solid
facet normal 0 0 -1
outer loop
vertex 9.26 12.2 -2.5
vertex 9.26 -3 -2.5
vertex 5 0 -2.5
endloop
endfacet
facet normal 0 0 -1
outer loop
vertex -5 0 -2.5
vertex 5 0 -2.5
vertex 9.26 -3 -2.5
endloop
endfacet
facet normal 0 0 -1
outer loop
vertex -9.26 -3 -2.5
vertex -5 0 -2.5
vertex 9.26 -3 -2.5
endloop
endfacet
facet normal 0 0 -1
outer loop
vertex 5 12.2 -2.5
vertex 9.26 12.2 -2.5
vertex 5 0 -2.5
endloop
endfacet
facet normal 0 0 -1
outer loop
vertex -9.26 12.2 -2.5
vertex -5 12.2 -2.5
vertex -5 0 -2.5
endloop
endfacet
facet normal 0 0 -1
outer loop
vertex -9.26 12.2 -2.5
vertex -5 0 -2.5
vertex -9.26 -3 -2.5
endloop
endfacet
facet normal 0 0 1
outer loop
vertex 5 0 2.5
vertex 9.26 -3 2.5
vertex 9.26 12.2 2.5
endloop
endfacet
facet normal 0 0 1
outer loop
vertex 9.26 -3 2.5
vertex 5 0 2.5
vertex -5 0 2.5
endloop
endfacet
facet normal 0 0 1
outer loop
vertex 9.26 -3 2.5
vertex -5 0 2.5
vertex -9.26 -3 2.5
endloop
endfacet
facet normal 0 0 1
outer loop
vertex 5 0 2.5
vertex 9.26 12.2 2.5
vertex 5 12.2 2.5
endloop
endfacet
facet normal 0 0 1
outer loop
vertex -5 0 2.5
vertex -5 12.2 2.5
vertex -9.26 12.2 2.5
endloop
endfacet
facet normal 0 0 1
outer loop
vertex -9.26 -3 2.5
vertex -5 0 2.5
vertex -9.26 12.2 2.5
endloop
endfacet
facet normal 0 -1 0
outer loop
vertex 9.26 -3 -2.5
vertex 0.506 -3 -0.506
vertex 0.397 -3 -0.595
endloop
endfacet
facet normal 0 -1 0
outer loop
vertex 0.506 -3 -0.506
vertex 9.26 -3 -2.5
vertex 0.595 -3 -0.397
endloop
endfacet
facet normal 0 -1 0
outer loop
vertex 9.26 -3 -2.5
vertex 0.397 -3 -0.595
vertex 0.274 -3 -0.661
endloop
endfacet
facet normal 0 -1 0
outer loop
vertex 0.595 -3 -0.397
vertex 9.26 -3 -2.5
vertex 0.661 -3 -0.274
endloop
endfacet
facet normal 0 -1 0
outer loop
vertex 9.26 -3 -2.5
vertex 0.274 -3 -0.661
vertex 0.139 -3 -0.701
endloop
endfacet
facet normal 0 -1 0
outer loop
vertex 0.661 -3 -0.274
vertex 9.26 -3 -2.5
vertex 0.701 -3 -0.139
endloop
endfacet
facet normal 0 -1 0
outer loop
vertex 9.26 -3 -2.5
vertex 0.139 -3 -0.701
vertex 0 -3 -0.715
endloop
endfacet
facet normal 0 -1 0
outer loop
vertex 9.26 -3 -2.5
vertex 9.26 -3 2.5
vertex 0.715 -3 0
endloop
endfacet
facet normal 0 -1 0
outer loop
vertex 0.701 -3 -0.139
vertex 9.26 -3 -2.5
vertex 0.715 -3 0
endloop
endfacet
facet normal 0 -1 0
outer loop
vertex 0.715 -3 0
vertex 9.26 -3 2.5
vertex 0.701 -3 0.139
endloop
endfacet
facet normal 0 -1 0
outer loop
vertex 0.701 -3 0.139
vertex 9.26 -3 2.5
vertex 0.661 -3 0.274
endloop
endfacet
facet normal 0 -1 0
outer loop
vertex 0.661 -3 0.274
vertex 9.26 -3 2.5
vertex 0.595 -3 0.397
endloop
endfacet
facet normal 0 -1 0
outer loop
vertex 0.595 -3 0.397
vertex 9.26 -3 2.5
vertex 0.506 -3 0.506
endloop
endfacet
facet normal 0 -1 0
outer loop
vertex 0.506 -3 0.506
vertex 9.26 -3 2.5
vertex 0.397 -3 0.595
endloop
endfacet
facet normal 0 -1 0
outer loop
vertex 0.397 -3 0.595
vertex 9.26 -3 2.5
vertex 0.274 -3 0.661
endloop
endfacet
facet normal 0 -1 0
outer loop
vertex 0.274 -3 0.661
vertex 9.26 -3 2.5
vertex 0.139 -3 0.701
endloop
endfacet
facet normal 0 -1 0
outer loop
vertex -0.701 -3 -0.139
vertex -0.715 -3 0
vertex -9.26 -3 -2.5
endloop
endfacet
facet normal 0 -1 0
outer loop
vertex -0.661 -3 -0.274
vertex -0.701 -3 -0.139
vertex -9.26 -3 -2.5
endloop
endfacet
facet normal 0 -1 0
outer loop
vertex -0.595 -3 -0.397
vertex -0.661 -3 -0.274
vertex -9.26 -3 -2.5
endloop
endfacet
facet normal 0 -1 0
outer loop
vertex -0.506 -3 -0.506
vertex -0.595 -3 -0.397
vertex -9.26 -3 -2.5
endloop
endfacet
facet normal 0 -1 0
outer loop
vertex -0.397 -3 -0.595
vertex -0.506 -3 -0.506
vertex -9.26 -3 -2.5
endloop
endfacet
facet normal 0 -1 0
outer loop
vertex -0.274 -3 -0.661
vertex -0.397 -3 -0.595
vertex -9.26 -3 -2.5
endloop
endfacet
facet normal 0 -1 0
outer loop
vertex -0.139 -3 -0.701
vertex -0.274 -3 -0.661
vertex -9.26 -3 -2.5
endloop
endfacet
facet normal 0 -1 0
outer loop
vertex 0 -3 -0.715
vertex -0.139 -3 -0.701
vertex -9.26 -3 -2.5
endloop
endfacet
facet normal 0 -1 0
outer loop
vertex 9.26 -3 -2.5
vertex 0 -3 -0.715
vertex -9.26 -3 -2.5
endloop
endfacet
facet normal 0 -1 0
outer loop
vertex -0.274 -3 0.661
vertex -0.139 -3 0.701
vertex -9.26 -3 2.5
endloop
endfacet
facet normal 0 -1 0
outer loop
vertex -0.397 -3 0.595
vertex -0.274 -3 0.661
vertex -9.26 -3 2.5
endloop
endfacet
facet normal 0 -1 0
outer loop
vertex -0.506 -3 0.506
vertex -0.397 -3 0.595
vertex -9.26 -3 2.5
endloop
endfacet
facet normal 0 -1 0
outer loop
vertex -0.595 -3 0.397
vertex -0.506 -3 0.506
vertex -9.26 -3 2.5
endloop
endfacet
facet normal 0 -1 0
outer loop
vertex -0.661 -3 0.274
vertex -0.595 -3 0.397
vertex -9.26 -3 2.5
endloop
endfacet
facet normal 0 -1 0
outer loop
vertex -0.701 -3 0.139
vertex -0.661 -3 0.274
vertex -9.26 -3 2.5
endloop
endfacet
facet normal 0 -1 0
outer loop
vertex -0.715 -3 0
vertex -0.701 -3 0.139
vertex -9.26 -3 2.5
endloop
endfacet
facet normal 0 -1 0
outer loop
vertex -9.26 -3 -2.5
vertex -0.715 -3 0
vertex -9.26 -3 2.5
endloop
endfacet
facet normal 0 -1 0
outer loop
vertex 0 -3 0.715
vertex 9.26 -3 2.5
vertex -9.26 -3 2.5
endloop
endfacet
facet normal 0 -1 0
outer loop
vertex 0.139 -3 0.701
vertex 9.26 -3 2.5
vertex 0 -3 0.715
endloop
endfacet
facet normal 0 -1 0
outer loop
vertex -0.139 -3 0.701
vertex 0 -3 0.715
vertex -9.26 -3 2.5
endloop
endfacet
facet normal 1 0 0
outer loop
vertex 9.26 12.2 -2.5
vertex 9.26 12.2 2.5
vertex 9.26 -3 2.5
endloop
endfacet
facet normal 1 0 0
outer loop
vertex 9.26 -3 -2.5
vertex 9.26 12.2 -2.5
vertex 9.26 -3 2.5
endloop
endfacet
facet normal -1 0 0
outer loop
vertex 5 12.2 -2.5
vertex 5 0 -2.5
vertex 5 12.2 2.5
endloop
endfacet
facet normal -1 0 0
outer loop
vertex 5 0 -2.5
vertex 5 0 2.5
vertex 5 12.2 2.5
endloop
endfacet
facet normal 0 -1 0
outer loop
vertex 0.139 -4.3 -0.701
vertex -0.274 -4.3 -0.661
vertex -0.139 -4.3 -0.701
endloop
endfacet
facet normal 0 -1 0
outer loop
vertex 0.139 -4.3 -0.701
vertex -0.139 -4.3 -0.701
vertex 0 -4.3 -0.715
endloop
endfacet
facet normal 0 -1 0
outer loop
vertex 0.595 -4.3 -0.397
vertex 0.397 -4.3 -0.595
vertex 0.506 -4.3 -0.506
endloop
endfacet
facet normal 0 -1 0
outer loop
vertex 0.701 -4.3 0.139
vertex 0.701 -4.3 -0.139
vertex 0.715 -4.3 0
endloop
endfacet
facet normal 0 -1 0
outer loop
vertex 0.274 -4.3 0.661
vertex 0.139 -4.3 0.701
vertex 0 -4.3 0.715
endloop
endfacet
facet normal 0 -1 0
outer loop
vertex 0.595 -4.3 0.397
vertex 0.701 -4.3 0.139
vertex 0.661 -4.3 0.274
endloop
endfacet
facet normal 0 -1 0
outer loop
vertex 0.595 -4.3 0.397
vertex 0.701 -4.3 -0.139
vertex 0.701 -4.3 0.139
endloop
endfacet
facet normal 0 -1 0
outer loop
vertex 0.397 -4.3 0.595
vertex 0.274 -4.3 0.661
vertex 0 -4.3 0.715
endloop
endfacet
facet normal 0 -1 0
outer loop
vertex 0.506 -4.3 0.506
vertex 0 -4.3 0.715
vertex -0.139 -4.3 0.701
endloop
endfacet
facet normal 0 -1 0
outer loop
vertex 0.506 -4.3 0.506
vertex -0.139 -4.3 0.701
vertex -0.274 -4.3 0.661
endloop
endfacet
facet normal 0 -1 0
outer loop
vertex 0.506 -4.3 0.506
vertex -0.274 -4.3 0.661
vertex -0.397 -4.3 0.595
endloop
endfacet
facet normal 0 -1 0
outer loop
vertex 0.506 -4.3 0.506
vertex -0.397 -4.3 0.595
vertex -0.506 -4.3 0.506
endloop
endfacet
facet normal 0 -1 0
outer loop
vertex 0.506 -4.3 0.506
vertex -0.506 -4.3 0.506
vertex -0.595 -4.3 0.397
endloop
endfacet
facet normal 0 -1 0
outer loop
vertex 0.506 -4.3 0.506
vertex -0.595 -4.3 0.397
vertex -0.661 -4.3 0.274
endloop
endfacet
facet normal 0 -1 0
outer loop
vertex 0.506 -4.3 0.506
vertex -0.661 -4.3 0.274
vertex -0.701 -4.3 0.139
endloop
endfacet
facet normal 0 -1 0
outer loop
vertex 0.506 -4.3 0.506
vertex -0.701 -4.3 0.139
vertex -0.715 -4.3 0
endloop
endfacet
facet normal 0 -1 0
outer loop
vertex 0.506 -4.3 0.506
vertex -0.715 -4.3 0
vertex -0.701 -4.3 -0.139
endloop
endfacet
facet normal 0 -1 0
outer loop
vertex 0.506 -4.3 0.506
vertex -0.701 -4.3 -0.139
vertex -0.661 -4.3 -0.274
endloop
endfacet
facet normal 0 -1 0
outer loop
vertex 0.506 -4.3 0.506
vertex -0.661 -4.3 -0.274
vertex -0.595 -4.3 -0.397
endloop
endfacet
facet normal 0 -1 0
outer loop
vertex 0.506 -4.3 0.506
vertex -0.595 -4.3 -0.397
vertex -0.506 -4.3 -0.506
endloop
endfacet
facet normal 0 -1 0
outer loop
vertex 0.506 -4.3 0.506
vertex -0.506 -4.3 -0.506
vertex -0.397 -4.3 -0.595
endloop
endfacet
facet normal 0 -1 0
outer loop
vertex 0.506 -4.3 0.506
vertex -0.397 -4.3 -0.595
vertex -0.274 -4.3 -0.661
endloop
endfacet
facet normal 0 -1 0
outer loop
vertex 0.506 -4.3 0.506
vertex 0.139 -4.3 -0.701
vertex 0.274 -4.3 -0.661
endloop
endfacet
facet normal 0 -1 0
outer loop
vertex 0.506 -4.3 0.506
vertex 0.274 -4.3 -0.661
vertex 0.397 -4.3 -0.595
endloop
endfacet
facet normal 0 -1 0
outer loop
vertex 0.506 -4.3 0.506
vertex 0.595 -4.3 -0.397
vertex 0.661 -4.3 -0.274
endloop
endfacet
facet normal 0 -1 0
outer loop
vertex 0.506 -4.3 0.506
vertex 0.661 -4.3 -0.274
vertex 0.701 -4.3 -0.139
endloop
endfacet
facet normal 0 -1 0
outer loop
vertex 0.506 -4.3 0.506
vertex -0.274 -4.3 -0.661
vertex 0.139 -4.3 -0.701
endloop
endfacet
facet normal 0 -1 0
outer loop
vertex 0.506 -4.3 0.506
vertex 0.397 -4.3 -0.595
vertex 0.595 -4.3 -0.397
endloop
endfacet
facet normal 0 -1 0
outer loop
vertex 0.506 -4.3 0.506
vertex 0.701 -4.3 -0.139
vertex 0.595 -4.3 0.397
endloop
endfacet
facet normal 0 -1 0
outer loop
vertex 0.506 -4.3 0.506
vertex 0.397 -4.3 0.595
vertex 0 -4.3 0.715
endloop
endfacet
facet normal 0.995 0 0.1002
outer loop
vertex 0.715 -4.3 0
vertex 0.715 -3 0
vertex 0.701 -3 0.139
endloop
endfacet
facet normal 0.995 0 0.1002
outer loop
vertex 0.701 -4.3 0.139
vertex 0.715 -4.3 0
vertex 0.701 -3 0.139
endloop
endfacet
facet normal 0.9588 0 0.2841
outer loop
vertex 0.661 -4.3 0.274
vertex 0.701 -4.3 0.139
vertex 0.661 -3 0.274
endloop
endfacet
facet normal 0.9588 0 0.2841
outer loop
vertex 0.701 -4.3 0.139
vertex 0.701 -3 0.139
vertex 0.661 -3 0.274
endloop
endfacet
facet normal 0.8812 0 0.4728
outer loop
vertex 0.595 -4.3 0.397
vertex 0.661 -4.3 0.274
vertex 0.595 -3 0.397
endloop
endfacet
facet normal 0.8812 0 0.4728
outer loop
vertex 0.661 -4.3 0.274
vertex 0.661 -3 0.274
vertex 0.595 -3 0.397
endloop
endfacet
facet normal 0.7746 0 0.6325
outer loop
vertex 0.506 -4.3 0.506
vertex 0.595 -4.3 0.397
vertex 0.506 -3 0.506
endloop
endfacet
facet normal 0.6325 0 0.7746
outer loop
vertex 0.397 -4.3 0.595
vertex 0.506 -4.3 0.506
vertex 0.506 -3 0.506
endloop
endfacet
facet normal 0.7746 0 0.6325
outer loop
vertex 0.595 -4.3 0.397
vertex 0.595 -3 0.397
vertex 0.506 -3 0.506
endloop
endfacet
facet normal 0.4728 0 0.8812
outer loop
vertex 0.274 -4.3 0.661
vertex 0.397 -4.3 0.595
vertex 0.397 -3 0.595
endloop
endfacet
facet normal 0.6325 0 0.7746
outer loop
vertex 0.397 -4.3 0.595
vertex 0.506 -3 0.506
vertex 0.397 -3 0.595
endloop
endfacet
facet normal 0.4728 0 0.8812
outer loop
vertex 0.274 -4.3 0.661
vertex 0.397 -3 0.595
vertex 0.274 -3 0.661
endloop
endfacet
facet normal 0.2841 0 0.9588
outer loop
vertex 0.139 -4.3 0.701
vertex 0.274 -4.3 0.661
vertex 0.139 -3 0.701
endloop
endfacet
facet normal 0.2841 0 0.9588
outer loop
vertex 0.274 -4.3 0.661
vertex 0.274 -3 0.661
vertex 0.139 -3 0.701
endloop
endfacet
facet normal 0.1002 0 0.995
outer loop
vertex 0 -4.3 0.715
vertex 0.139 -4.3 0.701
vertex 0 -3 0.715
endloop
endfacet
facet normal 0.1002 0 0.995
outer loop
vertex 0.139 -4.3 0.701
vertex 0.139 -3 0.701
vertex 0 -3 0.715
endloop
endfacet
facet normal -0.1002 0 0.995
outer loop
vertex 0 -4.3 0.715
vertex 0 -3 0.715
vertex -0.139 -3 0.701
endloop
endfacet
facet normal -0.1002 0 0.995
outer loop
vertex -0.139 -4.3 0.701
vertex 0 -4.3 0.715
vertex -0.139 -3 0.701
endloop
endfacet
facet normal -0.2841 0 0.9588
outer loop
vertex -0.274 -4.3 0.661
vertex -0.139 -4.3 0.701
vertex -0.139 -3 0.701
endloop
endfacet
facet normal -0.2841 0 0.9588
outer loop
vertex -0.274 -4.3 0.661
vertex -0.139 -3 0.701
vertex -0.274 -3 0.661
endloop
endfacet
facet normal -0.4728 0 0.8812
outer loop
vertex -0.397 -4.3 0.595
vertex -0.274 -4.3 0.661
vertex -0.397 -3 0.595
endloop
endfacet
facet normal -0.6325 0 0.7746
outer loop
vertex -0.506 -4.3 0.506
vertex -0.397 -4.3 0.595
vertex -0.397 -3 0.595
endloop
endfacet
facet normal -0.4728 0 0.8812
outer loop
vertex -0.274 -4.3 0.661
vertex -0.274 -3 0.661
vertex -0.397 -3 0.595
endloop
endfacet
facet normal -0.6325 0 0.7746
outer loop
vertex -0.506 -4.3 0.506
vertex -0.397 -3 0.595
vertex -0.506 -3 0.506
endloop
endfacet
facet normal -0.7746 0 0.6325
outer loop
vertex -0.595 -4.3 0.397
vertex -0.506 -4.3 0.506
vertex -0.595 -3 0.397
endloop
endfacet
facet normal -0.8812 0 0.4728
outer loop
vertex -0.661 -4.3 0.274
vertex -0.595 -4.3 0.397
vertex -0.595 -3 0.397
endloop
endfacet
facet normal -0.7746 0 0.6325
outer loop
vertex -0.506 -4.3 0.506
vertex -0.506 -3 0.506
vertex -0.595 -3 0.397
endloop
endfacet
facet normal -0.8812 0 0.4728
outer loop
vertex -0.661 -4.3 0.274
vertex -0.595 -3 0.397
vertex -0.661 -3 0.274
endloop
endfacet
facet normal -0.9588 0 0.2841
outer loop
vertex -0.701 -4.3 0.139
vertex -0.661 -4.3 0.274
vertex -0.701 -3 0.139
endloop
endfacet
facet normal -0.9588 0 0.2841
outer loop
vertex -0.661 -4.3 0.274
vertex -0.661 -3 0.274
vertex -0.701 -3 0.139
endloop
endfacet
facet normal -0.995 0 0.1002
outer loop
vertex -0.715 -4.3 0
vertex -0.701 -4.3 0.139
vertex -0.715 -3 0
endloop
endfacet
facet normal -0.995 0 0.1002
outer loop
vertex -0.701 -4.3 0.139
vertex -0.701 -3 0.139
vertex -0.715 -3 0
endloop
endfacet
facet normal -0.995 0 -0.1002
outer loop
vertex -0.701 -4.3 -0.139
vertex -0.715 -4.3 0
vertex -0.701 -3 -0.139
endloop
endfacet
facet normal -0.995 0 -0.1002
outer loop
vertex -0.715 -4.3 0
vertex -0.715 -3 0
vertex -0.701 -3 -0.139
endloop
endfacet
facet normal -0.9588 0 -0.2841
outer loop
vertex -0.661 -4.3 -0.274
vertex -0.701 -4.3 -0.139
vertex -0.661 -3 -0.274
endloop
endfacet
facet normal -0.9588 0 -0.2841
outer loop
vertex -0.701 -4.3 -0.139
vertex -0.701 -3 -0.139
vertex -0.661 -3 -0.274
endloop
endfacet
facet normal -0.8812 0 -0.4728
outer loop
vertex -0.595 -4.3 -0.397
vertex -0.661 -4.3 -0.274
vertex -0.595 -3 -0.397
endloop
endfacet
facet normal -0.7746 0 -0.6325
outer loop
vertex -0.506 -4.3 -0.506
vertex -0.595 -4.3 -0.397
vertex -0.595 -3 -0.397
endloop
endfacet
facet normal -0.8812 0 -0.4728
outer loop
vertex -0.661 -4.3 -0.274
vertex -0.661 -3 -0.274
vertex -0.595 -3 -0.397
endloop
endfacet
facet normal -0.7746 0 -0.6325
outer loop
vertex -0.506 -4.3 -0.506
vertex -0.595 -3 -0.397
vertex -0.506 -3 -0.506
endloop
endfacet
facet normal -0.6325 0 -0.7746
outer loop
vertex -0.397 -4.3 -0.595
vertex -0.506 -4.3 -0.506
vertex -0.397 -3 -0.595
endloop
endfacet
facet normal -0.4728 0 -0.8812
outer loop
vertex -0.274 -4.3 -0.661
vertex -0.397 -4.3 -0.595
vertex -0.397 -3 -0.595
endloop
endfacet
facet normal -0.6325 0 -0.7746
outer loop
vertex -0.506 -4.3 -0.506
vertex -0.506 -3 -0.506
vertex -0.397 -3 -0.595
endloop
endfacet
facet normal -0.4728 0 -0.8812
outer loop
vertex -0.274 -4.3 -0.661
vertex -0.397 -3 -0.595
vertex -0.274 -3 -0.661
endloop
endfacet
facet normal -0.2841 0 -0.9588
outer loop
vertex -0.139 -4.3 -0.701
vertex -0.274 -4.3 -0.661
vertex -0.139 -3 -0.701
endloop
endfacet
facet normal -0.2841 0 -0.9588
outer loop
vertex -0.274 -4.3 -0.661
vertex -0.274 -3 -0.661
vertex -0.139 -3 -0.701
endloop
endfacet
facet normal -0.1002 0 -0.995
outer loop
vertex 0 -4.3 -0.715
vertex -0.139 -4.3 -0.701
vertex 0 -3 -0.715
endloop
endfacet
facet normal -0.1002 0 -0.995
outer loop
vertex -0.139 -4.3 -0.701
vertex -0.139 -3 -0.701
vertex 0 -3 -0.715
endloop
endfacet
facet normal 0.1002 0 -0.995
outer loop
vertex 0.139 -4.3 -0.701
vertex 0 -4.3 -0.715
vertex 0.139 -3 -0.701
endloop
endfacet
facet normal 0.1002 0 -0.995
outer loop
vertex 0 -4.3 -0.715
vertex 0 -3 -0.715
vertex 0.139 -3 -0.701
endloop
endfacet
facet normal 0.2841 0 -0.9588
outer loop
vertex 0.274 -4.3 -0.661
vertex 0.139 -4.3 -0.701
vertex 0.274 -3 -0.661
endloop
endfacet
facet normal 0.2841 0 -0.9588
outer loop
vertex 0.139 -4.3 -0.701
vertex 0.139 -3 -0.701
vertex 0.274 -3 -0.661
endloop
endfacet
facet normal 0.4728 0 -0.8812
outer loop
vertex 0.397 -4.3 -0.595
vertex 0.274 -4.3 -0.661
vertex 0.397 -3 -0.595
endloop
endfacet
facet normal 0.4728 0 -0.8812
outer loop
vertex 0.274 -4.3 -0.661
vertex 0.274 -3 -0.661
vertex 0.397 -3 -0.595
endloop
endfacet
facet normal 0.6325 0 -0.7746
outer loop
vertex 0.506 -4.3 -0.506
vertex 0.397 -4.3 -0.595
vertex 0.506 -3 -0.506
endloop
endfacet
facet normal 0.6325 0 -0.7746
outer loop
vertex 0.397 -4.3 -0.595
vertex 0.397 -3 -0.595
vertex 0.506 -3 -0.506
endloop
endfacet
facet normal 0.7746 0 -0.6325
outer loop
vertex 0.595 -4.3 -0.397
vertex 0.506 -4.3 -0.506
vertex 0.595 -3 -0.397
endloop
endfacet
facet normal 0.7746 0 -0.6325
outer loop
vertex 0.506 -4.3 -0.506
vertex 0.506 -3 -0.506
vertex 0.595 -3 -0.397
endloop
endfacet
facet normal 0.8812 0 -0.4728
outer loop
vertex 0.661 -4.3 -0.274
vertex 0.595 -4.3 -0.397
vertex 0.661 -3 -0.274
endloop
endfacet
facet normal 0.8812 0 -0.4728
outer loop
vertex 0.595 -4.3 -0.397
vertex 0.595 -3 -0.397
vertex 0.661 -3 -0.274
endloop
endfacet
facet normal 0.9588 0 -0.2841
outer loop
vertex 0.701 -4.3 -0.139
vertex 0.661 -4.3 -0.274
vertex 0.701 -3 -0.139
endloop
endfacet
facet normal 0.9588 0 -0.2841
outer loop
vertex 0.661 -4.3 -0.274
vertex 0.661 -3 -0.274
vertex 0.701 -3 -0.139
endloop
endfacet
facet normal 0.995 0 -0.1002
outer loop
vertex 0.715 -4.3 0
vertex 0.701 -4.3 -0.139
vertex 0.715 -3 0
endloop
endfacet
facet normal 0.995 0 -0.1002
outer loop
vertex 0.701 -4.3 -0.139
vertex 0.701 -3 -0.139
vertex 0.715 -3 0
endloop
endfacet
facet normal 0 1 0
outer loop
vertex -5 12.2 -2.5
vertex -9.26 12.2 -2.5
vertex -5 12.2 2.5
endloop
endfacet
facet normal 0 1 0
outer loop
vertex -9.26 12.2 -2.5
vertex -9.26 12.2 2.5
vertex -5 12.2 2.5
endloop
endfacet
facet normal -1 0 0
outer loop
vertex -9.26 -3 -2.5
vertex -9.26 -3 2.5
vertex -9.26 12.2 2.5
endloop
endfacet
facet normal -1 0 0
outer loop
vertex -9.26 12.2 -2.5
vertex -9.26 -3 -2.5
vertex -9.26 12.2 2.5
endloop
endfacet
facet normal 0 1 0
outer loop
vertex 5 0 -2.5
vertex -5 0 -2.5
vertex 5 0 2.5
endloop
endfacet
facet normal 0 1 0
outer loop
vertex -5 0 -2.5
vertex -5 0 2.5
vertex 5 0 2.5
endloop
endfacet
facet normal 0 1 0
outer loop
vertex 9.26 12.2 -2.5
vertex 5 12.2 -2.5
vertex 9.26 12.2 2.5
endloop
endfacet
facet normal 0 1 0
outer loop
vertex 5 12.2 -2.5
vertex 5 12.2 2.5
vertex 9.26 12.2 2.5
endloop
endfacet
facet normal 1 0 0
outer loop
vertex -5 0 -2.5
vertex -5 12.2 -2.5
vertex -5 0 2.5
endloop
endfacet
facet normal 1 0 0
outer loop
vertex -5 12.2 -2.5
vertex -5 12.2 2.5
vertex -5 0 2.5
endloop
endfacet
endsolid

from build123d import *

# Parameters (mm, degrees)
BOSS_EXTRUDE1_DEPTH = 2.5
SKETCH2_R           = 0.715
BOSS_EXTRUDE2_DEPTH = 1.3


with BuildPart() as part:
    # Sketch1 → Boss-Extrude1 (new body, symmetric)
    with BuildSketch(Plane.XY):
        Polygon((-9.26, -3), (-9.26, 12.2), (-5, 12.2), (-5, 0), (5, 0), (5, 12.2), (9.26, 12.2), (9.26, -3), align=None)
    extrude(amount=BOSS_EXTRUDE1_DEPTH, both=True)

    # Sketch2 → Boss-Extrude2 (add)
    with BuildSketch(Plane.XZ.offset(3)):
        Circle(SKETCH2_R)
    extrude(amount=BOSS_EXTRUDE2_DEPTH)


solid = part.part
